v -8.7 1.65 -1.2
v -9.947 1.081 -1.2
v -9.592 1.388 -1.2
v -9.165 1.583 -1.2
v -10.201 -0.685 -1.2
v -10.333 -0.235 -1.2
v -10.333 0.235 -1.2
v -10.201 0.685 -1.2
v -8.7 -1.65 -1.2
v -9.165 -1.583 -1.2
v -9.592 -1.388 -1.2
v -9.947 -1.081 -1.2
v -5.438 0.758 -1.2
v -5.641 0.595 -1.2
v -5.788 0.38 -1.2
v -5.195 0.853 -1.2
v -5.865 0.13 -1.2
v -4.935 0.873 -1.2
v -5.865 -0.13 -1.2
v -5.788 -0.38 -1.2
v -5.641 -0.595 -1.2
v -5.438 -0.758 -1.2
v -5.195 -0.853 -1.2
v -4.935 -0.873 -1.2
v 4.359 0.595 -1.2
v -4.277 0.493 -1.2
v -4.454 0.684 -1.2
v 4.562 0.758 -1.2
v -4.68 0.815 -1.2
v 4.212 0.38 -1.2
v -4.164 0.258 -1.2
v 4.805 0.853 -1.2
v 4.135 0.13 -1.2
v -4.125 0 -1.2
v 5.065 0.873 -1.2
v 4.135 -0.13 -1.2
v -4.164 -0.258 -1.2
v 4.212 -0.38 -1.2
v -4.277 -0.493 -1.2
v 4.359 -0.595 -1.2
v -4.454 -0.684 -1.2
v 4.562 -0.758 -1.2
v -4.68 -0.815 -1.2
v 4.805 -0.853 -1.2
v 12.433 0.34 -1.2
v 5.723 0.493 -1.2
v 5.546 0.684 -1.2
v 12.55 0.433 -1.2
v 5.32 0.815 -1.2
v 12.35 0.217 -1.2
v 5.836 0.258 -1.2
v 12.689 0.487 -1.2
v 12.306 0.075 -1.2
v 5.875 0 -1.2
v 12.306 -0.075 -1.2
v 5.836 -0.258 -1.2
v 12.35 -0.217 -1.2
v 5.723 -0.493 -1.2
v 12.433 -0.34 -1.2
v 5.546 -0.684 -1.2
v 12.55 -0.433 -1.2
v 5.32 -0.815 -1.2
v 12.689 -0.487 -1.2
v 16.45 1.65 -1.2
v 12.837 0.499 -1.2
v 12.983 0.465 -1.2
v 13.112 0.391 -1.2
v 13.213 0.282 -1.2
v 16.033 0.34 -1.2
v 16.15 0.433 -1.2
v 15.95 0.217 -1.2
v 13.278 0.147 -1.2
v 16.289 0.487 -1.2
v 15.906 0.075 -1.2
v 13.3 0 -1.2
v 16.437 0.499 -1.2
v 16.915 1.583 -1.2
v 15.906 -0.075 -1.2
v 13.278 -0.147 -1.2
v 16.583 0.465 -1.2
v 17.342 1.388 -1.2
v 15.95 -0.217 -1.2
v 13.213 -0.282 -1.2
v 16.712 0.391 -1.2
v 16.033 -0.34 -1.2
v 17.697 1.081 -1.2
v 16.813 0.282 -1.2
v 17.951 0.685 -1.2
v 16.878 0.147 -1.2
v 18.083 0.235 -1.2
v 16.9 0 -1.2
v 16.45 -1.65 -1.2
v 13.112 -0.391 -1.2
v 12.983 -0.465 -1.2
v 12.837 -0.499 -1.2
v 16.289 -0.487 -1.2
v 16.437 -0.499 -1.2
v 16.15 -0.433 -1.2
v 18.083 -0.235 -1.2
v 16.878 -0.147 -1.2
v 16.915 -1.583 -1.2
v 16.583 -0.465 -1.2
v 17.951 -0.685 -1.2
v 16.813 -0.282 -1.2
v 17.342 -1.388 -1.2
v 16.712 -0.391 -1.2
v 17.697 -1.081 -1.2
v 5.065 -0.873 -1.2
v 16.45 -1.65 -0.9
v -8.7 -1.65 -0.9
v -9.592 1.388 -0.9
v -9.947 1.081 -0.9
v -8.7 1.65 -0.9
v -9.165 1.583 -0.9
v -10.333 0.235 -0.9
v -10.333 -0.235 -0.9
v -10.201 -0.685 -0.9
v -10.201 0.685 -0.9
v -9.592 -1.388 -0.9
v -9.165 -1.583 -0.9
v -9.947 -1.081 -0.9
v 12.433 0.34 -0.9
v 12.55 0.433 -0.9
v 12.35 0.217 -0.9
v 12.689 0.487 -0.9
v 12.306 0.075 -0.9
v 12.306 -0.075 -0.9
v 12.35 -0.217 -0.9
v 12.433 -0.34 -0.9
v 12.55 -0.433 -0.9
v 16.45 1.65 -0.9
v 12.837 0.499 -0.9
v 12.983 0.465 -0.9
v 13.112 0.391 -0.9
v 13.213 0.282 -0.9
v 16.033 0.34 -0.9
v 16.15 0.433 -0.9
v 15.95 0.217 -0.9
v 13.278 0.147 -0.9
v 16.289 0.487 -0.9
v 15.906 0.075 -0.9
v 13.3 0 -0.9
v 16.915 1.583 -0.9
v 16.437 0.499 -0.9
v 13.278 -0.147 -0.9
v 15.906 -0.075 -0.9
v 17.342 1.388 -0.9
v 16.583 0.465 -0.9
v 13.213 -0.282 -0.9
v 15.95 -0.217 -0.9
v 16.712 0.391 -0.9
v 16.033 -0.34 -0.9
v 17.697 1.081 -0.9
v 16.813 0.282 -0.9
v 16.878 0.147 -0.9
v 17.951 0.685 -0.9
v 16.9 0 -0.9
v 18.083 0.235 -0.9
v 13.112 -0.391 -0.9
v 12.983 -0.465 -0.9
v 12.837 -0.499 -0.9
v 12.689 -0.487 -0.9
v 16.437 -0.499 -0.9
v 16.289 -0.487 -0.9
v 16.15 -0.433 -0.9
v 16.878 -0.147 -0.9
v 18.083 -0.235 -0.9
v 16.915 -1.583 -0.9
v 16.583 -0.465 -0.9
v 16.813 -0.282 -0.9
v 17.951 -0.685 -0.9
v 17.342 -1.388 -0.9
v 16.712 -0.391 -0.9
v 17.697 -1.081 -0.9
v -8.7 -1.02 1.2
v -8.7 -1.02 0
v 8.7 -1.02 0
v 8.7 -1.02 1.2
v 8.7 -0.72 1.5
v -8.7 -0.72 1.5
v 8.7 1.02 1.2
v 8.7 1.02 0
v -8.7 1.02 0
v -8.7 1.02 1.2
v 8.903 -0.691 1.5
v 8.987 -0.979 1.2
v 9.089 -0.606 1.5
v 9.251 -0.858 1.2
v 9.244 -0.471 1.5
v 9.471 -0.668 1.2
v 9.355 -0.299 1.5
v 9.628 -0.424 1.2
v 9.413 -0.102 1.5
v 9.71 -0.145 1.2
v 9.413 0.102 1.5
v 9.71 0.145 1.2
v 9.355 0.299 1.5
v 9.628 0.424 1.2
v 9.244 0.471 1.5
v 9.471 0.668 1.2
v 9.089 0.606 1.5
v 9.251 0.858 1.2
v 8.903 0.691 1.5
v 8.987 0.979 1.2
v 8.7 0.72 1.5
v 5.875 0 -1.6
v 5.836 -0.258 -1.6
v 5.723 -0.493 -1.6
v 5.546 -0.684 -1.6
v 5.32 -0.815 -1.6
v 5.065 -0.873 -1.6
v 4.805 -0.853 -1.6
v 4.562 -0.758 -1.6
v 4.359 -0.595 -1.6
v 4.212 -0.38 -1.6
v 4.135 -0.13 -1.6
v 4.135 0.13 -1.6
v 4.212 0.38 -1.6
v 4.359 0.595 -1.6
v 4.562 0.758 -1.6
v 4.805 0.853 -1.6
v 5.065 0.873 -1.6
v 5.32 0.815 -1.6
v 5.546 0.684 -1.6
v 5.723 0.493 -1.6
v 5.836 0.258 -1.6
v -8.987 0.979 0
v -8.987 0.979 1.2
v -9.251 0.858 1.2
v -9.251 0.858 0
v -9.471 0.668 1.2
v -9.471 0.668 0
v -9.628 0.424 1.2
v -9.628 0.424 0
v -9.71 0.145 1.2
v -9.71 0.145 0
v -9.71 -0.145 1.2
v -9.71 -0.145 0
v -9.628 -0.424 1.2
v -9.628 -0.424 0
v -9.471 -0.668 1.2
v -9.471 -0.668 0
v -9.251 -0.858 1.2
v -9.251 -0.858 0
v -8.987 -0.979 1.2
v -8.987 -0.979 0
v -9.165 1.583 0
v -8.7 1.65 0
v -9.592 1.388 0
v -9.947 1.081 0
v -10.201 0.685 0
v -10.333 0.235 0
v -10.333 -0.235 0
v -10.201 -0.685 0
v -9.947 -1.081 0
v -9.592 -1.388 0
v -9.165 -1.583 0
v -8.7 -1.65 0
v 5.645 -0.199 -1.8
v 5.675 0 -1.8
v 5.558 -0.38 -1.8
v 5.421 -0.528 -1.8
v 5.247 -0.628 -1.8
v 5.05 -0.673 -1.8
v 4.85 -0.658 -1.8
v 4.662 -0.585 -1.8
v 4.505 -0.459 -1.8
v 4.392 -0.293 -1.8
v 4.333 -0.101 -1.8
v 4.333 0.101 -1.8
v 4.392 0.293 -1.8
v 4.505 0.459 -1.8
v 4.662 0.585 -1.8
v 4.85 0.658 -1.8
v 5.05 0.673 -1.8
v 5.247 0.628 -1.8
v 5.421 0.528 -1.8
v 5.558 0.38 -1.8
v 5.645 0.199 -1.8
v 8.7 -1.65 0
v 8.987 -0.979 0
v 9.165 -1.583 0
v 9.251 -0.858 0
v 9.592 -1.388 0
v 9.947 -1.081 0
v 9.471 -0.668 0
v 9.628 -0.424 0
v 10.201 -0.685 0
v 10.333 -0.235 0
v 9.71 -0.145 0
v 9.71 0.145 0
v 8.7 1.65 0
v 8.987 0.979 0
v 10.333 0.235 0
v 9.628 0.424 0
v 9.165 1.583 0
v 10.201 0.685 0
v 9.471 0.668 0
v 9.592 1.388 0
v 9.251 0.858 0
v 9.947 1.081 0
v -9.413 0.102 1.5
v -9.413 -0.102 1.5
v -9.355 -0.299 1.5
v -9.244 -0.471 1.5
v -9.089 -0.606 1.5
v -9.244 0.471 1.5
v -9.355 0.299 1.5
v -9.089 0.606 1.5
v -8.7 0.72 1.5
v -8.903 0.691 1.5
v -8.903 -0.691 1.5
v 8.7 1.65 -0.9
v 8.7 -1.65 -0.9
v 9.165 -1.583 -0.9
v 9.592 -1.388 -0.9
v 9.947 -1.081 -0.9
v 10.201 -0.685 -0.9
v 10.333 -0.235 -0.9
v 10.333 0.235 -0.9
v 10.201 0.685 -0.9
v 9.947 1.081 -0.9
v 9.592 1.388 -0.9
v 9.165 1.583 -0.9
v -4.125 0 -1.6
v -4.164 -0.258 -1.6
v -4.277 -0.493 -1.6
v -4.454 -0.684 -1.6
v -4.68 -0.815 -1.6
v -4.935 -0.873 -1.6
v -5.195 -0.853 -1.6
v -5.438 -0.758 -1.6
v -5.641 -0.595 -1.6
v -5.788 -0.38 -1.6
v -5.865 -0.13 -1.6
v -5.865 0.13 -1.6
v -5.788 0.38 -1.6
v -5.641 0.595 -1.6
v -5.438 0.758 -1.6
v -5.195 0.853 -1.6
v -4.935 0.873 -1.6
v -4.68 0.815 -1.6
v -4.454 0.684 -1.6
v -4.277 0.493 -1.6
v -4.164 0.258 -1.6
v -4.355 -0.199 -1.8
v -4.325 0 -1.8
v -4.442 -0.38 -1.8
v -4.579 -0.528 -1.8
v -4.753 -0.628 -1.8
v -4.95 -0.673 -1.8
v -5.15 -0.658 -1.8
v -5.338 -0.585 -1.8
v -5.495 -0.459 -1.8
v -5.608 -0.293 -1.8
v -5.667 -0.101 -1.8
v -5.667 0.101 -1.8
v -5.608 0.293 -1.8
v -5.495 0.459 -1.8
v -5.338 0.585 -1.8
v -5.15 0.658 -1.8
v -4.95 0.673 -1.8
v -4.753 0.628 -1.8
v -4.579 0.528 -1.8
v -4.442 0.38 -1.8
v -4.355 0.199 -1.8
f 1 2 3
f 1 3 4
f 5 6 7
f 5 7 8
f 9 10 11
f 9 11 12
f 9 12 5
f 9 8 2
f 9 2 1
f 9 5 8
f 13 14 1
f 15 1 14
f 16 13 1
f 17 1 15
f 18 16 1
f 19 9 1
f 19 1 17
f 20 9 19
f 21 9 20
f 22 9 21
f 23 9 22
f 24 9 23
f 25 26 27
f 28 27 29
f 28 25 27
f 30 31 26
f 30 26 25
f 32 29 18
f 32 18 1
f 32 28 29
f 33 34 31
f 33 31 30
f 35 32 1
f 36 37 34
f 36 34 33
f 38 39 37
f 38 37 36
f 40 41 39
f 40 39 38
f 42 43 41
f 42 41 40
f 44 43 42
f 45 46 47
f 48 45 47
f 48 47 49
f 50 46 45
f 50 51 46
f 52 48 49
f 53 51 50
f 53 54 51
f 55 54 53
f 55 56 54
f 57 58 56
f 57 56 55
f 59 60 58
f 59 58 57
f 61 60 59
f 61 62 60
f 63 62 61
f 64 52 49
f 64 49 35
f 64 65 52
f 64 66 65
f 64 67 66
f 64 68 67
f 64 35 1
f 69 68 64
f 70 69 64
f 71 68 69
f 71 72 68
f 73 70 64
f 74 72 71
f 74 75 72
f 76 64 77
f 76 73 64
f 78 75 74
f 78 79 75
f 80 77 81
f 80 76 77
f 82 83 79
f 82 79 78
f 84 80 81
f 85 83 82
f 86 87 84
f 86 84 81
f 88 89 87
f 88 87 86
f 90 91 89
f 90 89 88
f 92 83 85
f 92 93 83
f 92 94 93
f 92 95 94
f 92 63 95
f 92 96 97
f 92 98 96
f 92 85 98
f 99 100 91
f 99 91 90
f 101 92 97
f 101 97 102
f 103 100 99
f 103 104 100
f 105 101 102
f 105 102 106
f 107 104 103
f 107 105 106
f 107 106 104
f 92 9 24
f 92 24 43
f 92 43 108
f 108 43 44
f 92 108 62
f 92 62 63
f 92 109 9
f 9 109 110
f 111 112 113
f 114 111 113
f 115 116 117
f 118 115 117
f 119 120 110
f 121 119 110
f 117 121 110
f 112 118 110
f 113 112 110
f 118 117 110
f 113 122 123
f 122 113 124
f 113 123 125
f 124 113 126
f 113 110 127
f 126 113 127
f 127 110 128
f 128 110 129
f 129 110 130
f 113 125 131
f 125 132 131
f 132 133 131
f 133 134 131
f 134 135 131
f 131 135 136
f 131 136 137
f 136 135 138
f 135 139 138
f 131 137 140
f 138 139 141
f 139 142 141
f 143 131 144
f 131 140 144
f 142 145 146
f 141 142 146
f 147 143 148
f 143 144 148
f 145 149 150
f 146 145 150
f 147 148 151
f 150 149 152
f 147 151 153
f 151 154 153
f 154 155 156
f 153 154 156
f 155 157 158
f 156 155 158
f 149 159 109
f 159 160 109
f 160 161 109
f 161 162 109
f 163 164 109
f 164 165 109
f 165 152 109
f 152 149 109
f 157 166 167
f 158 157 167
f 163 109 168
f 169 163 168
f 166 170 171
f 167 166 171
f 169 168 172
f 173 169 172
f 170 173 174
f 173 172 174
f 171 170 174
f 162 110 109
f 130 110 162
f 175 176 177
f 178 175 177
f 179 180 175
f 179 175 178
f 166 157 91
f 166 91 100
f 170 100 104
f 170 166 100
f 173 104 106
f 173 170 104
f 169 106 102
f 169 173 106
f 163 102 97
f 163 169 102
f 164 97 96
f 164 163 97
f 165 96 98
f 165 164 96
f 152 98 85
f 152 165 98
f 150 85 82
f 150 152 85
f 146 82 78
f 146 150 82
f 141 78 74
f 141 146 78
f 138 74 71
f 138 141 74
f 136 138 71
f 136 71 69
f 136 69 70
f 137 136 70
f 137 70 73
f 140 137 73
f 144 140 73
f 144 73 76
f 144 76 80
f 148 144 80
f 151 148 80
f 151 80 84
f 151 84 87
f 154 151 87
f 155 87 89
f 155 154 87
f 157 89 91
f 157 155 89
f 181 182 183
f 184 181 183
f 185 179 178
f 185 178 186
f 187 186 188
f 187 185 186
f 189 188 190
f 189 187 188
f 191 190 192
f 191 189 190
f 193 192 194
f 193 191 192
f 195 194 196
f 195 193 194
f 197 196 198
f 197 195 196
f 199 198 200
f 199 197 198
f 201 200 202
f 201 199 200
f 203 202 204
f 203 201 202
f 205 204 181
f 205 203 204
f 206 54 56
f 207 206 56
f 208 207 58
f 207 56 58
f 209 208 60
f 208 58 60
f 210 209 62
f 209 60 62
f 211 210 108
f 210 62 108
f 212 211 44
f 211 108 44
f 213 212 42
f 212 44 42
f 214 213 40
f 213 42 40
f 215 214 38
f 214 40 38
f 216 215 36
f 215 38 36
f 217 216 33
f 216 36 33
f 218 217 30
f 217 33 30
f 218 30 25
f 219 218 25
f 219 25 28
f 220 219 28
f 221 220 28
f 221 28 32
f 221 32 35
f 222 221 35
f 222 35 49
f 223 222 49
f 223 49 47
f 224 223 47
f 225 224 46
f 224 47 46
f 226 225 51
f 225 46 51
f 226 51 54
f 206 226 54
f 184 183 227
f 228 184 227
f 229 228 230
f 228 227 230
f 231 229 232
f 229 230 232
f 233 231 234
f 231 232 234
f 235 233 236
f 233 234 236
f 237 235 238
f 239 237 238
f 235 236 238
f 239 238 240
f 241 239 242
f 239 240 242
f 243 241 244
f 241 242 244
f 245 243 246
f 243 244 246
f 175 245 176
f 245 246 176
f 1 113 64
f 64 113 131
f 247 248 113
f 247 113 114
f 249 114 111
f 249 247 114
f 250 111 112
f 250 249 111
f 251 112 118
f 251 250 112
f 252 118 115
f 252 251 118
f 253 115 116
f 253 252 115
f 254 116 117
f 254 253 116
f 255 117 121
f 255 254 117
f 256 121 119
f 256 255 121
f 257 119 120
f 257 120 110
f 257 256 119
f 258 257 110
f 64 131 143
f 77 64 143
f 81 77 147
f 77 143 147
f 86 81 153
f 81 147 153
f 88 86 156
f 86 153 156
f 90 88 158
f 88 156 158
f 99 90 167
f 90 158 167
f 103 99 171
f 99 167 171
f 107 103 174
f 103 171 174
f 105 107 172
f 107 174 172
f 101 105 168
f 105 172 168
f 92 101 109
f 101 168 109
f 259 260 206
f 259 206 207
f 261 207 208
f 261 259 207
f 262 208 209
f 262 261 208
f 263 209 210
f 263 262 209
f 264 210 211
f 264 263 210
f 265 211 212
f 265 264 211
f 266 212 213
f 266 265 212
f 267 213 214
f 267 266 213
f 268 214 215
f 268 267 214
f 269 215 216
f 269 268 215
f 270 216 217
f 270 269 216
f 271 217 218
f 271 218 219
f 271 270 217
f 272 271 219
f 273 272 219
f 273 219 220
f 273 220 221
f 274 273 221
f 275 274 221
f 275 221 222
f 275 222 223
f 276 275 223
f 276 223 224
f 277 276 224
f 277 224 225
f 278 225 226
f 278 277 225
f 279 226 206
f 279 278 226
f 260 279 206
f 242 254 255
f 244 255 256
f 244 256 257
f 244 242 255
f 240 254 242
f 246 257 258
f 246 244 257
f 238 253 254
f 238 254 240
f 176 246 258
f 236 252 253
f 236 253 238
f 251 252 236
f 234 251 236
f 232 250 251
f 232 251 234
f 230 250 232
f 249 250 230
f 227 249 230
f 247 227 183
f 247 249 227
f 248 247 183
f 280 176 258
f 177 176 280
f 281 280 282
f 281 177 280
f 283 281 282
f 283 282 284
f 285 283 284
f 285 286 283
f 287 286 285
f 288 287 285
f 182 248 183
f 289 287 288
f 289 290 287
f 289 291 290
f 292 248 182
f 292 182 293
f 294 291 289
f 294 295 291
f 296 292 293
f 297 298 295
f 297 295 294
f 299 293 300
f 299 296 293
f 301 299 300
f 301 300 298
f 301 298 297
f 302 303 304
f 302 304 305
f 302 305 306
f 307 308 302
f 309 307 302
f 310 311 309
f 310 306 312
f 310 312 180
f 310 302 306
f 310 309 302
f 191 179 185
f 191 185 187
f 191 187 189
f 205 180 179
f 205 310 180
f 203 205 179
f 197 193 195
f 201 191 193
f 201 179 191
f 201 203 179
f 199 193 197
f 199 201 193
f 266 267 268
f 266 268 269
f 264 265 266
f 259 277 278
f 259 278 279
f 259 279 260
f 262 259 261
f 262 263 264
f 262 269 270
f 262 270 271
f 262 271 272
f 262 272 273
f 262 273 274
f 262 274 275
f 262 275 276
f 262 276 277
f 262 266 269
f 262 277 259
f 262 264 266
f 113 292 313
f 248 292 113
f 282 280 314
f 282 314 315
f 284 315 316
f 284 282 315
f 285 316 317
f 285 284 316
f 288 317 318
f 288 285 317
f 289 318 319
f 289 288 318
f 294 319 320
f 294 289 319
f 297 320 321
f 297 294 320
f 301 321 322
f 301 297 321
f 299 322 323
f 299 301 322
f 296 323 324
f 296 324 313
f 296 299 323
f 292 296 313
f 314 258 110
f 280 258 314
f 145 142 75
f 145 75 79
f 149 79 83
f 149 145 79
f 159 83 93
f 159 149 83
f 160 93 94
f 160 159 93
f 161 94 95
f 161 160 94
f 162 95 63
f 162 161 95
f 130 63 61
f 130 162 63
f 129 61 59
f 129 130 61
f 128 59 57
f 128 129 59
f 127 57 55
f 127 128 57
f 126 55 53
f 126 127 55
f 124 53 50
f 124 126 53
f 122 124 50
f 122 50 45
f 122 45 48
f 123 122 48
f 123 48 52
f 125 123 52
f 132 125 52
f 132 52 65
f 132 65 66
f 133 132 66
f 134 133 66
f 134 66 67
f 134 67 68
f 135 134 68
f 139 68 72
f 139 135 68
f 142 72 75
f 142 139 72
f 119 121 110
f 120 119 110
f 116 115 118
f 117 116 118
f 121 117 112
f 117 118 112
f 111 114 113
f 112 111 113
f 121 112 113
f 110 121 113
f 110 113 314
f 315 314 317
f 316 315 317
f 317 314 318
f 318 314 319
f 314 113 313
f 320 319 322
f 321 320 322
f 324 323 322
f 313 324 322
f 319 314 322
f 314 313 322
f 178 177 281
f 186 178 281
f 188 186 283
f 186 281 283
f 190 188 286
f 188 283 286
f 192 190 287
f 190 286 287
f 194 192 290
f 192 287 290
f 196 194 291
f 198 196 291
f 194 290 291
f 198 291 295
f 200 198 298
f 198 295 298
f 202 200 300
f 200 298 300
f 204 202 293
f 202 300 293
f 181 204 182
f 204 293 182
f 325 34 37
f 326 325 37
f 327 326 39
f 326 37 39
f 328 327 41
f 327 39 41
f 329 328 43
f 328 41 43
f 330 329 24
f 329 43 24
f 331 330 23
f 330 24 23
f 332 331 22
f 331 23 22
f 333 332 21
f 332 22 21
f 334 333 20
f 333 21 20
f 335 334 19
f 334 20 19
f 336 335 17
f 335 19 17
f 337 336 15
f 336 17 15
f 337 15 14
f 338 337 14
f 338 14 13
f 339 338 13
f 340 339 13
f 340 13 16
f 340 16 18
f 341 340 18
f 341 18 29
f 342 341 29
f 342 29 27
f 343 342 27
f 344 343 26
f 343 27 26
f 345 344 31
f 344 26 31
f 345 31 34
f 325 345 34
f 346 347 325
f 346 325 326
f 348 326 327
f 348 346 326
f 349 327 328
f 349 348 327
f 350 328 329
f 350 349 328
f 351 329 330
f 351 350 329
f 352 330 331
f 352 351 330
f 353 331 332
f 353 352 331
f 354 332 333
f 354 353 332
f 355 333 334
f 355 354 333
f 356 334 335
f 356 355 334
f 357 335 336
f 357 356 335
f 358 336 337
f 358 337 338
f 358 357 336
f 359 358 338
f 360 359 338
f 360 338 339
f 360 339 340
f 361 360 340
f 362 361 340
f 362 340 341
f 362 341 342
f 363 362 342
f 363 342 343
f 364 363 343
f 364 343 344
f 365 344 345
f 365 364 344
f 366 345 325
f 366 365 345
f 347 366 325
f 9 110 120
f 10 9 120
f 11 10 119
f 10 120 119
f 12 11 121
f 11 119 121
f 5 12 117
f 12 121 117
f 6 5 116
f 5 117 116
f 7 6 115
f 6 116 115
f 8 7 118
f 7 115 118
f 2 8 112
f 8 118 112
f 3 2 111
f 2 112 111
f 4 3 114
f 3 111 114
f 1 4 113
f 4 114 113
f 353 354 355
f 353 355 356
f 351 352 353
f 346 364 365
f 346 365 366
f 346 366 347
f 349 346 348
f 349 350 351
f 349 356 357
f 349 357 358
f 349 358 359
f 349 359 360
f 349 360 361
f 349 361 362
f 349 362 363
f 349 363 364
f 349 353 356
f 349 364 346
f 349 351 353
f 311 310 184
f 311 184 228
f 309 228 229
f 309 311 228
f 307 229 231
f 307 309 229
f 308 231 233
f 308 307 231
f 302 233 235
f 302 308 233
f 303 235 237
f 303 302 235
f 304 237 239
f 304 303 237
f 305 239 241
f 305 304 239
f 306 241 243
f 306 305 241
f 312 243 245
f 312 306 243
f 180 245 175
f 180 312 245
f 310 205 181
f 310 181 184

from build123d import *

# Parameters (mm, degrees)
F1_DEPTH = 1.5
F2_SIZE  = 0.3
F4_DEPTH = 0.9
F5_R     = 0.5
F6_DEPTH = 0.3
F7_R     = 0.875
F8_DEPTH = 0.6
F9_SIZE  = 0.2


with BuildPart() as f1:
    # F0 (on Top) → F1 (new body)
    with BuildSketch(Plane.XY):
        with BuildLine():
            Line((8.7, 1.02), (-8.7, 1.02))
            ThreePointArc((-8.7, 1.02), (-9.72, 0), (-8.7, -1.02))
            Line((-8.7, -1.02), (8.7, -1.02))
            ThreePointArc((8.7, -1.02), (9.72, 0), (8.7, 1.02))
        make_face()
    extrude(amount=F1_DEPTH)

    # F2
    f2_edges = [f1.edges().sort_by_distance(p)[0] for p in [
        (0, 1.02, 1.5),
        (-9.72, 0, 1.5),
        (0, -1.02, 1.5),
        (9.72, 0, 1.5),
    ]]
    chamfer(f2_edges, length=F2_SIZE)

    # F3 (on Top) → F4 (join)
    with BuildSketch(Plane.XY):
        with BuildLine():
            ThreePointArc((-8.7, 1.65), (-10.35, 0), (-8.7, -1.65))
            Line((-8.7, -1.65), (8.7, -1.65))
            ThreePointArc((8.7, -1.65), (10.35, 0), (8.7, 1.65))
            Line((8.7, 1.65), (-8.7, 1.65))
        make_face()
    extrude(amount=-F4_DEPTH)


with BuildPart() as f6:
    # F5 (on face) → F6 (new body)
    with BuildSketch(Plane(origin=(0, 0, -0.9), x_dir=(1, 0, 0), z_dir=(0, 0, -1))):
        with BuildLine():
            Line((16.45, 1.65), (-8.7, 1.65))
            ThreePointArc((-8.7, 1.65), (-10.35, 0), (-8.7, -1.65))
            Line((-8.7, -1.65), (16.45, -1.65))
            ThreePointArc((16.45, -1.65), (18.1, 0), (16.45, 1.65))
        make_face()
        with Locations((12.8, 0)):
            Circle(F5_R, mode=Mode.SUBTRACT)
        with Locations((16.4, 0)):
            Circle(F5_R, mode=Mode.SUBTRACT)
    extrude(amount=F6_DEPTH)

    # F7 (on face) → F8 (join)
    with BuildSketch(Plane(origin=(0, 0, -1.2), x_dir=(1, 0, 0), z_dir=(0, 0, -1))):
        with Locations((-5, 0)):
            Circle(F7_R)
        with Locations((5, 0)):
            Circle(F7_R)
    extrude(amount=F8_DEPTH)

    # F9
    f9_edges = [f6.edges().sort_by_distance(p)[0] for p in [
        (-5.875, 0, -1.8),
        (4.125, 0, -1.8),
    ]]
    chamfer(f9_edges, length=F9_SIZE)


solid = Compound([f1.part, f6.part])
